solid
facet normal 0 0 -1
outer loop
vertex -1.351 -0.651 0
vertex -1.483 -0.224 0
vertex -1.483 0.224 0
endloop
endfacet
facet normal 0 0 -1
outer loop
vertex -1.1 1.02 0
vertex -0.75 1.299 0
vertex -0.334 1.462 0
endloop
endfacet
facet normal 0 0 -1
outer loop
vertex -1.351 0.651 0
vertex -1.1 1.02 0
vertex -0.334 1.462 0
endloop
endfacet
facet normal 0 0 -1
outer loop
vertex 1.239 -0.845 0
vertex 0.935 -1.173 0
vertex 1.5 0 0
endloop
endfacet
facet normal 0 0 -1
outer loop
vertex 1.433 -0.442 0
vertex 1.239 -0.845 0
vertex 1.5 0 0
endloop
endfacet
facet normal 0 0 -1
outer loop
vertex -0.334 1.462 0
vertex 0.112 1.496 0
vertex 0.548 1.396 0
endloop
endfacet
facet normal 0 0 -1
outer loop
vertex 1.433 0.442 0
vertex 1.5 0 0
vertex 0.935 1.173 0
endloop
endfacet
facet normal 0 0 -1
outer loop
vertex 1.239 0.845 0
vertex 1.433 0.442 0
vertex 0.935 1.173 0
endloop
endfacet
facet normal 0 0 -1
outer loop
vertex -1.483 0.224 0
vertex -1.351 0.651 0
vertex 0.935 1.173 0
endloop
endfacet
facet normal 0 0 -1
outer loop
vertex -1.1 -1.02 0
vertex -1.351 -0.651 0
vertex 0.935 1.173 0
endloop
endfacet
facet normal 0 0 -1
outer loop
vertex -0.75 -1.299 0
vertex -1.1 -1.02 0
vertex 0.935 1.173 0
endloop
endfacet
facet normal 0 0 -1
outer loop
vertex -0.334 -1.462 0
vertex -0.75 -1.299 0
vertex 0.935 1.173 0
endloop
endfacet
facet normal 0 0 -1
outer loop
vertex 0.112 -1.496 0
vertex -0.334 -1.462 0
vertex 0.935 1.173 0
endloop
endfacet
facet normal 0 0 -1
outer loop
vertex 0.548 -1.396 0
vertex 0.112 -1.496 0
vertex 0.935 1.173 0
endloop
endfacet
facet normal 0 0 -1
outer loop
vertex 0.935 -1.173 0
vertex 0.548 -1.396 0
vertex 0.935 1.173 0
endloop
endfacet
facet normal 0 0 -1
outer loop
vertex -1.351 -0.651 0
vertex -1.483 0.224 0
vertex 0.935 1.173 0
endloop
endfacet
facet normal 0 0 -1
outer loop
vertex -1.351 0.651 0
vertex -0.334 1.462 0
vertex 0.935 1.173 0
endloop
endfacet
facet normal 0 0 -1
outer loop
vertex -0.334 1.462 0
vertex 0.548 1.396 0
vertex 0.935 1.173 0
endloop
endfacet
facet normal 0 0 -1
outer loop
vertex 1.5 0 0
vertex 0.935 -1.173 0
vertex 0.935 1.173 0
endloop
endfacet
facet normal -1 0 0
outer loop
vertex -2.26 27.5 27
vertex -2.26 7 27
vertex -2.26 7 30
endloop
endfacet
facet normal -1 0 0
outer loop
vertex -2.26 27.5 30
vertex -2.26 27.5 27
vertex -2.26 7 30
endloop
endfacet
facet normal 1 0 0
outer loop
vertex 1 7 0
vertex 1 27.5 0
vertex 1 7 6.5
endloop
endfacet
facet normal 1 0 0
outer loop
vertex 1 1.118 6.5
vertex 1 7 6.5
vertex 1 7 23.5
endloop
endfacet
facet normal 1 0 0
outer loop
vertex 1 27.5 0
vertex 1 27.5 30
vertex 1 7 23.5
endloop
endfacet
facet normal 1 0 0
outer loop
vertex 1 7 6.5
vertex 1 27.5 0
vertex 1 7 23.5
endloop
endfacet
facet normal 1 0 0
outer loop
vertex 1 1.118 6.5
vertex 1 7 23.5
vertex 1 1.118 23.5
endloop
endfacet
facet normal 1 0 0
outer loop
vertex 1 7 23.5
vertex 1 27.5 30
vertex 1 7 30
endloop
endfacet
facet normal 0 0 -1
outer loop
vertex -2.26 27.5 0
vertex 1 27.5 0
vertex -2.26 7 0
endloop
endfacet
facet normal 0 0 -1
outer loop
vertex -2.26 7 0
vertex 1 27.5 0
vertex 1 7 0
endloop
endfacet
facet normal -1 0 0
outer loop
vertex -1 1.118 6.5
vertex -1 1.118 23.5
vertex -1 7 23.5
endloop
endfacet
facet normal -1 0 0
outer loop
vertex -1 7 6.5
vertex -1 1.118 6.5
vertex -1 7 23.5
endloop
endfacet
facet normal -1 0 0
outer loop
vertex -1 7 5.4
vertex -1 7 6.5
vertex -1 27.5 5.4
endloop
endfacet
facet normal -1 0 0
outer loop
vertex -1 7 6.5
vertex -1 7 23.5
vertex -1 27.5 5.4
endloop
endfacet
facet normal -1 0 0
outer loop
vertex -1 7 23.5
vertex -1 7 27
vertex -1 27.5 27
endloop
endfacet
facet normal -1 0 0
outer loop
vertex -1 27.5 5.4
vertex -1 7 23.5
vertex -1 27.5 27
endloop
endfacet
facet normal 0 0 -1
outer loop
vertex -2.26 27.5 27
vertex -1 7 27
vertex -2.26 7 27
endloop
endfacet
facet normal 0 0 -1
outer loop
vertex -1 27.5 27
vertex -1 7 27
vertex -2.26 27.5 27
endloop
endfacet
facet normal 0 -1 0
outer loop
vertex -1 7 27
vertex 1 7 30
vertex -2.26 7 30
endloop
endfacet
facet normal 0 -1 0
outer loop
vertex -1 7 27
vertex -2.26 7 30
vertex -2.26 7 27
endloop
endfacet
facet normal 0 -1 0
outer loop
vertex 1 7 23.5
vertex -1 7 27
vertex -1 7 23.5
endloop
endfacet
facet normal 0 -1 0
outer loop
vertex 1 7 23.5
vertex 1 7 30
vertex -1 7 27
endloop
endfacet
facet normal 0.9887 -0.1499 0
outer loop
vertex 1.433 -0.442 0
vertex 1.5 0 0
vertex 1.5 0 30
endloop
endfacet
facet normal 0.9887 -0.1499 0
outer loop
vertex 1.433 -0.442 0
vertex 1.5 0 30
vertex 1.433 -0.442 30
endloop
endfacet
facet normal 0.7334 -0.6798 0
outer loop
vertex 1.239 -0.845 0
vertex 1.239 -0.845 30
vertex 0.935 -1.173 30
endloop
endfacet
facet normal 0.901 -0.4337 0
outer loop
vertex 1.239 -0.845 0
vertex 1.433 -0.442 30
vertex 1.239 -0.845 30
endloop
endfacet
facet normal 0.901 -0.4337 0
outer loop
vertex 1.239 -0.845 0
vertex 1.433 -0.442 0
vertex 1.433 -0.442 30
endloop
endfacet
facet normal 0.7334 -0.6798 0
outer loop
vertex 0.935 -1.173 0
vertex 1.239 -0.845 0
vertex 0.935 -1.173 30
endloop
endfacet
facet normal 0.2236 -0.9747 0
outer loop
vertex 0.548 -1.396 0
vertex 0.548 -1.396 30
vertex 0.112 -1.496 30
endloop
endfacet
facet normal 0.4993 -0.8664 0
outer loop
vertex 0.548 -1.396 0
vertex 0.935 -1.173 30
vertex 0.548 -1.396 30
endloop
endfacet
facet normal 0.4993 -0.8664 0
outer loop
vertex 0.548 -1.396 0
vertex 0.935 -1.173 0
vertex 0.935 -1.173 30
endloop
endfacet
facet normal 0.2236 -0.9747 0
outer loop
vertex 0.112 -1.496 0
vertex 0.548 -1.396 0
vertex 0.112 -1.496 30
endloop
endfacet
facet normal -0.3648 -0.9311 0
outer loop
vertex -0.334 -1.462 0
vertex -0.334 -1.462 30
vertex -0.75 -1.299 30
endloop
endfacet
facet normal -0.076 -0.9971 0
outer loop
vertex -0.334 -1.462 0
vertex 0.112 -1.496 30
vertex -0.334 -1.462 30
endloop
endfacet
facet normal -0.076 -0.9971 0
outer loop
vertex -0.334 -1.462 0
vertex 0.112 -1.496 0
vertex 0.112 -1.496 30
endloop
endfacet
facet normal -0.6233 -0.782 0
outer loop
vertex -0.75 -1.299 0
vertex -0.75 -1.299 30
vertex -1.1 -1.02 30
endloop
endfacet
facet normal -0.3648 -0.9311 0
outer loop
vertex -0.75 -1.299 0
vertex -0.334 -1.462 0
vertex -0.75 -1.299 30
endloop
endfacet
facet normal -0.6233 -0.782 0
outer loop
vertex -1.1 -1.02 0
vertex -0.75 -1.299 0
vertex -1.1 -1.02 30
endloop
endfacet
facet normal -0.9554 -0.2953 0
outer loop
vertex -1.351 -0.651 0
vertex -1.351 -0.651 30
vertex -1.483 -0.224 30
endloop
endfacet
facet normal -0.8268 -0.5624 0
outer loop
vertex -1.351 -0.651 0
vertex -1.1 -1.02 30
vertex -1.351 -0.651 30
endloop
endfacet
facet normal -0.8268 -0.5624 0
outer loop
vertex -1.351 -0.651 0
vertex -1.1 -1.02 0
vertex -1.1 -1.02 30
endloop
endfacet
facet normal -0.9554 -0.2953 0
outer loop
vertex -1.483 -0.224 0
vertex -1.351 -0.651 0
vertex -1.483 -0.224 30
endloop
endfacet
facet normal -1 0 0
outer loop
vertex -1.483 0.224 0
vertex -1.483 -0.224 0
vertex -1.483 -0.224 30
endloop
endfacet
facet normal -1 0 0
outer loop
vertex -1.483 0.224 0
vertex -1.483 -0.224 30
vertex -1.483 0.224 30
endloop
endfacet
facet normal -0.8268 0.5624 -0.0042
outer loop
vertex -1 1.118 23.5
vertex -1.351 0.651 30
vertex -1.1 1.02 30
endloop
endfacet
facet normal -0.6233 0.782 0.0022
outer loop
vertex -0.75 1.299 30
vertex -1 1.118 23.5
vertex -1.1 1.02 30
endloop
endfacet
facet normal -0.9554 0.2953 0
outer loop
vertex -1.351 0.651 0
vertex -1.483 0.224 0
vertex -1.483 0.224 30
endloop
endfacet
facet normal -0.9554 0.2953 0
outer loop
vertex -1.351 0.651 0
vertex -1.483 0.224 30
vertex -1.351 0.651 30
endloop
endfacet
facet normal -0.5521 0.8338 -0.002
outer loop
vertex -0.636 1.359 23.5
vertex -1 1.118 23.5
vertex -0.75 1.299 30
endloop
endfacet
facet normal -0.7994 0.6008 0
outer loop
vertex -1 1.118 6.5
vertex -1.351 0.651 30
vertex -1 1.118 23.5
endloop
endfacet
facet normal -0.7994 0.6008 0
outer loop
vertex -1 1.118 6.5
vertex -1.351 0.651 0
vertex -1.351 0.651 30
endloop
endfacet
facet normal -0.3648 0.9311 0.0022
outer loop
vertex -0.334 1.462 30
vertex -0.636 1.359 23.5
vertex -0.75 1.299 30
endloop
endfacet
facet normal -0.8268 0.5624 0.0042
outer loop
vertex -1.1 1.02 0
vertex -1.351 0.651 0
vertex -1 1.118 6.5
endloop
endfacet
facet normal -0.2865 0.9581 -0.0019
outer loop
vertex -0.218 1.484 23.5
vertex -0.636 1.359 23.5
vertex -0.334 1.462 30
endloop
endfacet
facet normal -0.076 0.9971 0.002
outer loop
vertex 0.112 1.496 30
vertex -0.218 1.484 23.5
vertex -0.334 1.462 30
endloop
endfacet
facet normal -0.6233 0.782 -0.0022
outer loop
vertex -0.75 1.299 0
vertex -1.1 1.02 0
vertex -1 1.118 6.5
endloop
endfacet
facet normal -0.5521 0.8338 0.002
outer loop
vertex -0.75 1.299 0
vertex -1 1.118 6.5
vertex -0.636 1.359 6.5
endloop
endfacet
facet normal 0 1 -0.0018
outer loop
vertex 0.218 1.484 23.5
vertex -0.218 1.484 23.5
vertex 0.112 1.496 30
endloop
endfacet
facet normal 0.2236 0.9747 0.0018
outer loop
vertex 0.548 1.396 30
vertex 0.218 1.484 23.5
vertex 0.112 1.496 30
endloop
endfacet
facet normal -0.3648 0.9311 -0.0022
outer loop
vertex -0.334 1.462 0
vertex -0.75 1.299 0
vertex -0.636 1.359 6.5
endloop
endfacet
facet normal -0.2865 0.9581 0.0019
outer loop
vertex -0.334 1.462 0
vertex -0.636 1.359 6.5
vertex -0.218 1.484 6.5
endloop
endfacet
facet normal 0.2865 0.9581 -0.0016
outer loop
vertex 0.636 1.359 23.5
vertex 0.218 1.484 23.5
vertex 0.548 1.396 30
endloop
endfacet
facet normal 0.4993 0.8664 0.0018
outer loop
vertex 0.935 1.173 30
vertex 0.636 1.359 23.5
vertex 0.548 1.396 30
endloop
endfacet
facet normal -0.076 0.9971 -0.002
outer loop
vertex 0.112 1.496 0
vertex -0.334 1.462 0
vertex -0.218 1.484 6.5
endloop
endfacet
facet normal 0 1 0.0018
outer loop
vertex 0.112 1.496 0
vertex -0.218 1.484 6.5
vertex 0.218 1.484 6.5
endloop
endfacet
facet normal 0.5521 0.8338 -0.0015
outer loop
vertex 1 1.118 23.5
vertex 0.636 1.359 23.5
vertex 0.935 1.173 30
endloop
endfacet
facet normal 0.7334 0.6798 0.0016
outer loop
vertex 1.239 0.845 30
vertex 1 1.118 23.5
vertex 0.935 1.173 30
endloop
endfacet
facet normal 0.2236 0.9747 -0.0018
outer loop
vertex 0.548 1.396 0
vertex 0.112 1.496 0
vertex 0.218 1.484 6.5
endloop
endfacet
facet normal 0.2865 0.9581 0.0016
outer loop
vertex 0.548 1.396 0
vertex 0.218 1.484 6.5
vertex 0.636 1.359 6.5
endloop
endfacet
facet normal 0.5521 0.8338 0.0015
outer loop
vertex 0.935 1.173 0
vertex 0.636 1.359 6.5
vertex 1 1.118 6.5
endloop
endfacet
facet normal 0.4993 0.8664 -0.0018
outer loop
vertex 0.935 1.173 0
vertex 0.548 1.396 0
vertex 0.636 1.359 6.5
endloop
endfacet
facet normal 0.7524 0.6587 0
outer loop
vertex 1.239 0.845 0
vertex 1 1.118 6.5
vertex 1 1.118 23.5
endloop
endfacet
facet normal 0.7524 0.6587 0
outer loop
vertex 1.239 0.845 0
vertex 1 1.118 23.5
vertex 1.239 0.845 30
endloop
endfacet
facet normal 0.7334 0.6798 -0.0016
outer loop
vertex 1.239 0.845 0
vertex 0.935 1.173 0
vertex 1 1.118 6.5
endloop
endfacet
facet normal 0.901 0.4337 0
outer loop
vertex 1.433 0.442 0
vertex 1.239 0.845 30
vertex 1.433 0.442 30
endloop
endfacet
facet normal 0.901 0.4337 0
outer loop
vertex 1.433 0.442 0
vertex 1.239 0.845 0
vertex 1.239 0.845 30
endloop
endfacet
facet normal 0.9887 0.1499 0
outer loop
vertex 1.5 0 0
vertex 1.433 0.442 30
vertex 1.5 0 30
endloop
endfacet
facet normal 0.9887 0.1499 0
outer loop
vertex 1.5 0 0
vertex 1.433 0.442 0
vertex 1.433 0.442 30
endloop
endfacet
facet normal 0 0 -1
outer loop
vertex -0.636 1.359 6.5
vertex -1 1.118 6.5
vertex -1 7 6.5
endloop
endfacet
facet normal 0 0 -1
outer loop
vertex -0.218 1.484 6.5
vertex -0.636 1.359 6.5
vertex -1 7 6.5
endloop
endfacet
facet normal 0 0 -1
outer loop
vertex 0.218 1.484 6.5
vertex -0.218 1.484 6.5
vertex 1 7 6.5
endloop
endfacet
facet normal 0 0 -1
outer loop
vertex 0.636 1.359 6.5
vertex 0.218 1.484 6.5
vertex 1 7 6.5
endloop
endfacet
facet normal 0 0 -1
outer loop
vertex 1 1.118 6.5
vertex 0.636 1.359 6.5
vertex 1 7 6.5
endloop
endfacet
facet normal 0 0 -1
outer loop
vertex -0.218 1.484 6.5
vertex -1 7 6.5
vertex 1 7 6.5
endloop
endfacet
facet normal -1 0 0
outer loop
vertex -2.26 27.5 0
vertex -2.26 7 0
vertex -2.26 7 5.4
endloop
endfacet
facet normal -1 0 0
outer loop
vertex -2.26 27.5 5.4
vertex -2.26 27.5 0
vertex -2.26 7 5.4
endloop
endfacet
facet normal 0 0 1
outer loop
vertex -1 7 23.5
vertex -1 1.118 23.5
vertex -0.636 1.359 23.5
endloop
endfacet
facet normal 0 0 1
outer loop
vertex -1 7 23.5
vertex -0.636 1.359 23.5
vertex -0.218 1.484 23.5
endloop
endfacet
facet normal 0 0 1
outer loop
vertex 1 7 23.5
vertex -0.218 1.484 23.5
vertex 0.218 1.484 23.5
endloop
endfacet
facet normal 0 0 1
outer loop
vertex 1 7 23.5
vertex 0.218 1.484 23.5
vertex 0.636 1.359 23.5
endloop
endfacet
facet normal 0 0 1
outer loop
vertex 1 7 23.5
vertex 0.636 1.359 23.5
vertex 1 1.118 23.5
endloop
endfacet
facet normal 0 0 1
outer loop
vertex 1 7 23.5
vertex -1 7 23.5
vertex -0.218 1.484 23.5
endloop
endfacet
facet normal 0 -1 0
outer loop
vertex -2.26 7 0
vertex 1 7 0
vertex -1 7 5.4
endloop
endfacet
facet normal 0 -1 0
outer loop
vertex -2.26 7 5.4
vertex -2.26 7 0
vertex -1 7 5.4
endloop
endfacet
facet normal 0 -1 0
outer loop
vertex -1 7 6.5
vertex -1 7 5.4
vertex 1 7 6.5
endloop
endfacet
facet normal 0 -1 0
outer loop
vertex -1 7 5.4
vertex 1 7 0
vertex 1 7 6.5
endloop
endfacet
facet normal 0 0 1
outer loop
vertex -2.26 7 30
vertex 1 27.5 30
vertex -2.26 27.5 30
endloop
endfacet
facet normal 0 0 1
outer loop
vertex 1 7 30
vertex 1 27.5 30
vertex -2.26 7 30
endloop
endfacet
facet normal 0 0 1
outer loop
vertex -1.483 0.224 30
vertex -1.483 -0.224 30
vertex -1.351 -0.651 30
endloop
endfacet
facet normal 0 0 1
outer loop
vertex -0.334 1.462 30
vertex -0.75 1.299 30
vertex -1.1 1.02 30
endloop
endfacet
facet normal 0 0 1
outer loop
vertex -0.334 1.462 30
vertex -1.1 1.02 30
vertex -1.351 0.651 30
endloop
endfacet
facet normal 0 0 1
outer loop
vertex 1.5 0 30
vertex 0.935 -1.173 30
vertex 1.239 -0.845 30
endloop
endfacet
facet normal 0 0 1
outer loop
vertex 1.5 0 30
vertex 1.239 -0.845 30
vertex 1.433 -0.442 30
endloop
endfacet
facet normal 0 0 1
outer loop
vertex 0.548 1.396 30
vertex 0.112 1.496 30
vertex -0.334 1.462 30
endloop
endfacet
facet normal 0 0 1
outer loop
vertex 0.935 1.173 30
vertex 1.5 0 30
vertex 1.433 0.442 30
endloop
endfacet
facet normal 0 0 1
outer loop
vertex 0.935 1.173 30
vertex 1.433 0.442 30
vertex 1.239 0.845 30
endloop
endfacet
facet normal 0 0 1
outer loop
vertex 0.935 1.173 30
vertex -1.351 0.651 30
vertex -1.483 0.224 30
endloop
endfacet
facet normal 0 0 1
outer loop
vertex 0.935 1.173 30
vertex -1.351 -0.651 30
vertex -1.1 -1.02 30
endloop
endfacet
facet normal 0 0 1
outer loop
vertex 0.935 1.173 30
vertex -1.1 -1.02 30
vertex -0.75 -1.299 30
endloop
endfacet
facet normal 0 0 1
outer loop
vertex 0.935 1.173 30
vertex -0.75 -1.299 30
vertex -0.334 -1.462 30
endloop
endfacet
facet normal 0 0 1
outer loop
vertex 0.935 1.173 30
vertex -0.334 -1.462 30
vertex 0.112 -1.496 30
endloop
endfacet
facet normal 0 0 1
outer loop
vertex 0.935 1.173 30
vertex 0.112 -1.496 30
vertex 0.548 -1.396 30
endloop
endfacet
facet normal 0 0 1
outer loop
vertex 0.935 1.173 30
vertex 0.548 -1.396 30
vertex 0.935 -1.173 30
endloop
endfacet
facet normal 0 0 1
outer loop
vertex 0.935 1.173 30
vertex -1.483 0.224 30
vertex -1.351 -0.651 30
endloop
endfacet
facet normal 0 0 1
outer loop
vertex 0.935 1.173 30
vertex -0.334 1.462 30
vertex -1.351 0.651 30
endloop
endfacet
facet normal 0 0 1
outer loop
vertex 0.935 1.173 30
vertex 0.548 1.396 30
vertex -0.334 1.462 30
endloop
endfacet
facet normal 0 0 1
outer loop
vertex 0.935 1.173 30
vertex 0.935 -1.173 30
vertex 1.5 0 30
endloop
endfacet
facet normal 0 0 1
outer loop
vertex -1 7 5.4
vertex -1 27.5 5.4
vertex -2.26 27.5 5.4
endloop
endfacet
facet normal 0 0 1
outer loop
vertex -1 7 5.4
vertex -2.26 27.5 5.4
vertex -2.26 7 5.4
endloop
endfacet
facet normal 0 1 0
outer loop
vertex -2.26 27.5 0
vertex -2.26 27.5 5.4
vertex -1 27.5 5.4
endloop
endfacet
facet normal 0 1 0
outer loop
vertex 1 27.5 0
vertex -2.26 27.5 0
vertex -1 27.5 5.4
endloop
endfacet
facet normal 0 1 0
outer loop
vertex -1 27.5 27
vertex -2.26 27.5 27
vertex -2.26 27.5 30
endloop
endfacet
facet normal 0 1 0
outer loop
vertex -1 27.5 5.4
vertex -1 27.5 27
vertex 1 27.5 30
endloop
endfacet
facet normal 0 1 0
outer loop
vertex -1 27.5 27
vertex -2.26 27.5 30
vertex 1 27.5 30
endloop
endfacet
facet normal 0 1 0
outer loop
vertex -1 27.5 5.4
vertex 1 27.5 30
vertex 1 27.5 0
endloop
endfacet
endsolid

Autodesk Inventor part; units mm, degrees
ref_plane "YZ Plane" through (0, 0, 0) normal (1, 0, 0) x (0, 1, 0)
ref_plane "XZ Plane" through (0, 0, 0) normal (0, 1, 0) x (-1, 0, 0)
ref_plane "XY Plane" through (0, 0, 0) normal (0, 0, 1) x (1, 0, 0)
sketch "Sketch1" plane through (0, 0, 0) normal (0, 0, 1) x (1, 0, 0)
  circle A0 centre (0, 0) radius 1.5
  dimension "d0" = 3
extrude "Extrusion1" add sketch "Sketch1" along normal blind 30
ref_plane "Work Plane1" through (0, 0, 23.5) normal (0, 0, 1) x (1, 0, 0)
ref_plane "Work Plane2" through (0, 0, 6.5) normal (0, 0, -1) x (-1, 0, 0)
sketch "Sketch2" plane through (0, 0, 23.5) normal (0, 0, 1) x (1, 0, 0)
  circle A0 centre (0, 0) radius 1.5 projected
  line L0 (1, 0) -> (-1, 0)
  line L1 (-1, 0) -> (-1, 27.5)
  line L2 (-1, 27.5) -> (1, 27.5)
  line L3 (1, 27.5) -> (1, 0)
  dimension "d7" = 27.5
  dimension "d13" = 1
extrude "Extrusion2" add sketch "Sketch2" against normal up to surface (17 mm away) contours L3 L0 L1 A0 | A0 L1 L2 L3 picked at (0, 0.5)
sketch "Sketch3" plane through (1, 1.118, 23.5) normal (1, 0, 0) x (0, 0, -1)
  line L0 (17, 0) -> (17, 26.382) projected
  line L1 (0, 26.382) -> (17, 26.382) projected
  line L2 (0, 26.382) -> (0, 0) projected
  line L3 (17, 0) -> (0, 0) projected
  line L4 (0, 26.382) -> (-6.5, 26.382)
  line L5 (-6.5, 26.382) -> (-6.5, 5.882)
  line L6 (-6.5, 5.882) -> (0, 5.882)
  line L7 (0, 5.882) -> (0, 26.382)
  line L8 (17, 0) -> (17, 26.382) projected
  line L9 (17, 26.382) -> (23.5, 26.382)
  line L10 (23.5, 26.382) -> (23.5, 5.882)
  line L11 (23.5, 5.882) -> (17, 5.882)
  line L12 (17, 5.882) -> (17, 26.382)
  line L13 (23.5, -2.618) -> (23.5, 0.382) projected
  line L14 (-6.5, 0.382) -> (-6.5, -2.618) projected
  line L15 (0, 0) -> (17, 0) projected
  line L16 (17, 0) -> (17, 0) projected
  line L17 (17, 0) -> (0, 0) projected
  line L18 (0, 0) -> (0, 0) projected
  point P0 (23.5, -1.118)
  point P1 (20.25, 5.882)
  point P2 (-3.25, 5.882)
  point P3 (23.5, -1.118)
  point P4 (23.5, 16.132)
  point P5 (-6.5, 16.132)
  point P6 (-6.5, -1.118)
  dimension "d10" = 5.5
extrude "Extrusion3" add sketch "Sketch3" against normal up to surface (2 mm away) contours L0 L9 L10 L11 | L6 L5 L4 L2
sketch "Sketch5" plane through (-1, 1.118, 6.5) normal (-1, 0, 0) x (0, 0, 1)
  line L0 (17, 0) -> (0, 0) projected
  line L1 (17, 0) -> (17, 5.882) projected
  line L2 (23.5, 5.882) -> (17, 5.882) projected
  line L3 (23.5, 26.382) -> (23.5, 5.882) projected
  line L4 (23.5, 26.382) -> (-6.5, 26.382) projected
  line L5 (-6.5, 5.882) -> (-6.5, 26.382) projected
  line L6 (0, 5.882) -> (-6.5, 5.882) projected
  line L7 (0, 5.882) -> (0, 0) projected
  line L8 (23.5, 5.882) -> (17, 5.882) projected
  line L9 (23.5, 26.382) -> (-6.5, 26.382) projected
  line L10 (23.5, 5.882) -> (20.5, 5.882)
  line L11 (20.5, 5.882) -> (20.5, 26.382)
  line L12 (20.5, 26.382) -> (23.5, 26.382)
  line L13 (23.5, 26.382) -> (23.5, 5.882)
  line L14 (0, 5.882) -> (-6.5, 5.882) projected
  line L15 (-6.5, 26.382) -> (-1.1, 26.382)
  line L16 (-1.1, 26.382) -> (-1.1, 5.882)
  line L17 (-1.1, 5.882) -> (-6.5, 5.882)
  line L18 (-6.5, 5.882) -> (-6.5, 26.382)
  point P0 (-6.5, -1.118)
  dimension "d16" = 3
  dimension "d17" = 5.4
extrude "Extrusion5" add sketch "Sketch5" along normal blind 1.26 contours L11 L4 L3 L2 | L6 L5 L4 L16
properties part number "gpsDoor"
